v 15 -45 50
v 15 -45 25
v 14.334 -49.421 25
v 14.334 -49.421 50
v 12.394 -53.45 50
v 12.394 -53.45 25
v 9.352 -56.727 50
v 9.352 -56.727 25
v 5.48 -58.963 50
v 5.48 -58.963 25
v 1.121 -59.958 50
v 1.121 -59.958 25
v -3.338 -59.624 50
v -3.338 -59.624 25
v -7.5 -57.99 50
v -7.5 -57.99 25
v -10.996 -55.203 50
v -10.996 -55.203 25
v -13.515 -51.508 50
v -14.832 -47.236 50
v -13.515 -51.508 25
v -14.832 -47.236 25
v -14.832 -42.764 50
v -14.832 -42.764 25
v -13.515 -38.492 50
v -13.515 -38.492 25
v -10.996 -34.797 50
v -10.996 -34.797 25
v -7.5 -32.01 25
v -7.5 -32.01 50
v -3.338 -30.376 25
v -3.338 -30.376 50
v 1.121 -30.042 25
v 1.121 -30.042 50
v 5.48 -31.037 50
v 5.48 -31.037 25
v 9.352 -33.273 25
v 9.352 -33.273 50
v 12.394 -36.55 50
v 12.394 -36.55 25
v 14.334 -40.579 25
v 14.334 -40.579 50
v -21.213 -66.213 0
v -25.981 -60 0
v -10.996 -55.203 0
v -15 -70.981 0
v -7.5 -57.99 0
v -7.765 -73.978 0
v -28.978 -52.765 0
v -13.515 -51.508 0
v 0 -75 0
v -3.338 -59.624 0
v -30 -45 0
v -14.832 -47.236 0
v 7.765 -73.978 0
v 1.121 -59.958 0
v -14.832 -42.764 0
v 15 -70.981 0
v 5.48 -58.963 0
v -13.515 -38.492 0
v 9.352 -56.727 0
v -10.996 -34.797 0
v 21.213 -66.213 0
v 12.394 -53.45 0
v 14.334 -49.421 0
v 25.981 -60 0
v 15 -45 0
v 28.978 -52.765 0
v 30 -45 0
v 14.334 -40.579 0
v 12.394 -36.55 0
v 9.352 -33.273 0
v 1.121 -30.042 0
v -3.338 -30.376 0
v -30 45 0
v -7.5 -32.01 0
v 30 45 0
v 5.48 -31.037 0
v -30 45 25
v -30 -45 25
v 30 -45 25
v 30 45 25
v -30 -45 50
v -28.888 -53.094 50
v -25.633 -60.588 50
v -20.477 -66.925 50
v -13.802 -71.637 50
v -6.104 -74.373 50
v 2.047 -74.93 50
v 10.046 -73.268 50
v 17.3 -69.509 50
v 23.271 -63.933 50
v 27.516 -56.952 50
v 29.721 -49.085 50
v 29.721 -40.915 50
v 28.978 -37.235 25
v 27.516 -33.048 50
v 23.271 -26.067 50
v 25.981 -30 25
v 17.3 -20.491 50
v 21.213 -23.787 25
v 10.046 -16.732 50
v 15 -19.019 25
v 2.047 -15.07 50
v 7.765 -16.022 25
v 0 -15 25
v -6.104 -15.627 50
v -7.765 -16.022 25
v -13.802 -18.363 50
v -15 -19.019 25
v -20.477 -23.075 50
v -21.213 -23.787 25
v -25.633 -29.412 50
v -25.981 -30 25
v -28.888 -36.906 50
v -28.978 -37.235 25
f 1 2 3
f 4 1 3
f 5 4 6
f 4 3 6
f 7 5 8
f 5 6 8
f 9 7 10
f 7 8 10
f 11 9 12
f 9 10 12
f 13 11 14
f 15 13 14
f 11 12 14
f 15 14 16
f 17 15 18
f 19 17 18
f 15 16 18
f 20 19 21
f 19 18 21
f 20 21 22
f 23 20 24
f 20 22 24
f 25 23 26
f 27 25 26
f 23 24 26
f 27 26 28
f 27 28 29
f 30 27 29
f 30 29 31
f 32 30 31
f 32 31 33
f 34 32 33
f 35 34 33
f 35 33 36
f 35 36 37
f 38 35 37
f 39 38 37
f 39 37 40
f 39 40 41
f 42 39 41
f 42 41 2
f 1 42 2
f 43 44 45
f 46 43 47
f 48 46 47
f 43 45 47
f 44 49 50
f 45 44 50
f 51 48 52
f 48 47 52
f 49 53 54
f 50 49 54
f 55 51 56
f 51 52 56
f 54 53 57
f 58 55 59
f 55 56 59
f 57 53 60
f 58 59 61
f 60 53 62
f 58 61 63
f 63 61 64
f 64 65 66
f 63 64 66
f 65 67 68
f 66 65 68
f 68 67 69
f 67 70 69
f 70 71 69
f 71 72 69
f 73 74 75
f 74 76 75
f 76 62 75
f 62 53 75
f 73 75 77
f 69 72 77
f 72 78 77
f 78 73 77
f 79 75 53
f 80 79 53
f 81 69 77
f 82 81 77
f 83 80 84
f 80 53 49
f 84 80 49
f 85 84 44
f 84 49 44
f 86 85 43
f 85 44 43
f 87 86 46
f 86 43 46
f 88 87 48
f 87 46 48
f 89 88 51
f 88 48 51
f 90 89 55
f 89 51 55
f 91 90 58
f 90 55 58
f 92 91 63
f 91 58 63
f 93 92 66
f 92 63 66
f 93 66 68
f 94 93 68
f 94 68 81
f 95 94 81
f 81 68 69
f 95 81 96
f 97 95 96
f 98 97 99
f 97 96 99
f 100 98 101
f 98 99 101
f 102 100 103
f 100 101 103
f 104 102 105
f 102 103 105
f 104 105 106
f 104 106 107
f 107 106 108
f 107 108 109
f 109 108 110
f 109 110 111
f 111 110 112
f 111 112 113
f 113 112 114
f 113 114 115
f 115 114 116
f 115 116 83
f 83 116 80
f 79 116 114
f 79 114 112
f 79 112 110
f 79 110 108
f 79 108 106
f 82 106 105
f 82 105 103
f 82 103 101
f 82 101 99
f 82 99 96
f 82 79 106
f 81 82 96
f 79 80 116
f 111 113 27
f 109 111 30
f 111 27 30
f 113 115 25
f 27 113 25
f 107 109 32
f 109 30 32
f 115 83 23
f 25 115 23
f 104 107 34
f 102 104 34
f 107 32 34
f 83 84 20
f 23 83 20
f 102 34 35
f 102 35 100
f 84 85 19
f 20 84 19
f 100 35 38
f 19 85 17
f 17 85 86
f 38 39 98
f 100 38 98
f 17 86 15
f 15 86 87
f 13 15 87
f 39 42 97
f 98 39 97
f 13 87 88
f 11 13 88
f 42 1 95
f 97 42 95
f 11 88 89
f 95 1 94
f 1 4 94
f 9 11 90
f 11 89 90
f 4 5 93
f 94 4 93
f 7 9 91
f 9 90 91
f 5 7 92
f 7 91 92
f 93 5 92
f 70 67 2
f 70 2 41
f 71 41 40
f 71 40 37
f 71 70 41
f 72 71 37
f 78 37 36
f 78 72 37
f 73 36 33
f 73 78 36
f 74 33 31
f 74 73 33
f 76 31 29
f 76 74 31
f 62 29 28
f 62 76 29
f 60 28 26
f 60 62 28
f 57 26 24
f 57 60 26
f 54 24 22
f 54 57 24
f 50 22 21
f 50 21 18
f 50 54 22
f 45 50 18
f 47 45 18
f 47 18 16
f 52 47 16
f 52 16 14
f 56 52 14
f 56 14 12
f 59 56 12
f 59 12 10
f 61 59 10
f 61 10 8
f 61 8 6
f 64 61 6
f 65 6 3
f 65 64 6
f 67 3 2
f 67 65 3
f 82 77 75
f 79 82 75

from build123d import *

# Parameters (mm, degrees)
F0_R     = 15
F1_DEPTH = 25
F2_R     = 15
F3_DEPTH = 50


with BuildPart() as f1:
    # F0 (on Top) → F1 (new body)
    with BuildSketch(Plane.XY):
        with BuildLine():
            Line((30, -45), (30, 45))
            Line((30, 45), (-30, 45))
            Line((-30, 45), (-30, -45))
            ThreePointArc((-30, -45), (0, -15), (30, -45))
        make_face()
        with BuildLine():
            ThreePointArc((-30, -45), (0, -75), (30, -45))
            ThreePointArc((30, -45), (0, -15), (-30, -45))
        make_face()
        with Locations((0, -45)):
            Circle(F0_R, mode=Mode.SUBTRACT)
    extrude(amount=F1_DEPTH)

    # F2 (on face) → F3 (join)
    with BuildSketch(Plane(origin=(0, 0, 0), x_dir=(1, 0, 0), z_dir=(0, 0, -1))):
        with BuildLine():
            ThreePointArc((30, 45), (0, 75), (-30, 45))
            ThreePointArc((-30, 45), (0, 15), (30, 45))
        make_face()
        with Locations((0, 45)):
            Circle(F2_R, mode=Mode.SUBTRACT)
    extrude(amount=-F3_DEPTH)


solid = f1.part
